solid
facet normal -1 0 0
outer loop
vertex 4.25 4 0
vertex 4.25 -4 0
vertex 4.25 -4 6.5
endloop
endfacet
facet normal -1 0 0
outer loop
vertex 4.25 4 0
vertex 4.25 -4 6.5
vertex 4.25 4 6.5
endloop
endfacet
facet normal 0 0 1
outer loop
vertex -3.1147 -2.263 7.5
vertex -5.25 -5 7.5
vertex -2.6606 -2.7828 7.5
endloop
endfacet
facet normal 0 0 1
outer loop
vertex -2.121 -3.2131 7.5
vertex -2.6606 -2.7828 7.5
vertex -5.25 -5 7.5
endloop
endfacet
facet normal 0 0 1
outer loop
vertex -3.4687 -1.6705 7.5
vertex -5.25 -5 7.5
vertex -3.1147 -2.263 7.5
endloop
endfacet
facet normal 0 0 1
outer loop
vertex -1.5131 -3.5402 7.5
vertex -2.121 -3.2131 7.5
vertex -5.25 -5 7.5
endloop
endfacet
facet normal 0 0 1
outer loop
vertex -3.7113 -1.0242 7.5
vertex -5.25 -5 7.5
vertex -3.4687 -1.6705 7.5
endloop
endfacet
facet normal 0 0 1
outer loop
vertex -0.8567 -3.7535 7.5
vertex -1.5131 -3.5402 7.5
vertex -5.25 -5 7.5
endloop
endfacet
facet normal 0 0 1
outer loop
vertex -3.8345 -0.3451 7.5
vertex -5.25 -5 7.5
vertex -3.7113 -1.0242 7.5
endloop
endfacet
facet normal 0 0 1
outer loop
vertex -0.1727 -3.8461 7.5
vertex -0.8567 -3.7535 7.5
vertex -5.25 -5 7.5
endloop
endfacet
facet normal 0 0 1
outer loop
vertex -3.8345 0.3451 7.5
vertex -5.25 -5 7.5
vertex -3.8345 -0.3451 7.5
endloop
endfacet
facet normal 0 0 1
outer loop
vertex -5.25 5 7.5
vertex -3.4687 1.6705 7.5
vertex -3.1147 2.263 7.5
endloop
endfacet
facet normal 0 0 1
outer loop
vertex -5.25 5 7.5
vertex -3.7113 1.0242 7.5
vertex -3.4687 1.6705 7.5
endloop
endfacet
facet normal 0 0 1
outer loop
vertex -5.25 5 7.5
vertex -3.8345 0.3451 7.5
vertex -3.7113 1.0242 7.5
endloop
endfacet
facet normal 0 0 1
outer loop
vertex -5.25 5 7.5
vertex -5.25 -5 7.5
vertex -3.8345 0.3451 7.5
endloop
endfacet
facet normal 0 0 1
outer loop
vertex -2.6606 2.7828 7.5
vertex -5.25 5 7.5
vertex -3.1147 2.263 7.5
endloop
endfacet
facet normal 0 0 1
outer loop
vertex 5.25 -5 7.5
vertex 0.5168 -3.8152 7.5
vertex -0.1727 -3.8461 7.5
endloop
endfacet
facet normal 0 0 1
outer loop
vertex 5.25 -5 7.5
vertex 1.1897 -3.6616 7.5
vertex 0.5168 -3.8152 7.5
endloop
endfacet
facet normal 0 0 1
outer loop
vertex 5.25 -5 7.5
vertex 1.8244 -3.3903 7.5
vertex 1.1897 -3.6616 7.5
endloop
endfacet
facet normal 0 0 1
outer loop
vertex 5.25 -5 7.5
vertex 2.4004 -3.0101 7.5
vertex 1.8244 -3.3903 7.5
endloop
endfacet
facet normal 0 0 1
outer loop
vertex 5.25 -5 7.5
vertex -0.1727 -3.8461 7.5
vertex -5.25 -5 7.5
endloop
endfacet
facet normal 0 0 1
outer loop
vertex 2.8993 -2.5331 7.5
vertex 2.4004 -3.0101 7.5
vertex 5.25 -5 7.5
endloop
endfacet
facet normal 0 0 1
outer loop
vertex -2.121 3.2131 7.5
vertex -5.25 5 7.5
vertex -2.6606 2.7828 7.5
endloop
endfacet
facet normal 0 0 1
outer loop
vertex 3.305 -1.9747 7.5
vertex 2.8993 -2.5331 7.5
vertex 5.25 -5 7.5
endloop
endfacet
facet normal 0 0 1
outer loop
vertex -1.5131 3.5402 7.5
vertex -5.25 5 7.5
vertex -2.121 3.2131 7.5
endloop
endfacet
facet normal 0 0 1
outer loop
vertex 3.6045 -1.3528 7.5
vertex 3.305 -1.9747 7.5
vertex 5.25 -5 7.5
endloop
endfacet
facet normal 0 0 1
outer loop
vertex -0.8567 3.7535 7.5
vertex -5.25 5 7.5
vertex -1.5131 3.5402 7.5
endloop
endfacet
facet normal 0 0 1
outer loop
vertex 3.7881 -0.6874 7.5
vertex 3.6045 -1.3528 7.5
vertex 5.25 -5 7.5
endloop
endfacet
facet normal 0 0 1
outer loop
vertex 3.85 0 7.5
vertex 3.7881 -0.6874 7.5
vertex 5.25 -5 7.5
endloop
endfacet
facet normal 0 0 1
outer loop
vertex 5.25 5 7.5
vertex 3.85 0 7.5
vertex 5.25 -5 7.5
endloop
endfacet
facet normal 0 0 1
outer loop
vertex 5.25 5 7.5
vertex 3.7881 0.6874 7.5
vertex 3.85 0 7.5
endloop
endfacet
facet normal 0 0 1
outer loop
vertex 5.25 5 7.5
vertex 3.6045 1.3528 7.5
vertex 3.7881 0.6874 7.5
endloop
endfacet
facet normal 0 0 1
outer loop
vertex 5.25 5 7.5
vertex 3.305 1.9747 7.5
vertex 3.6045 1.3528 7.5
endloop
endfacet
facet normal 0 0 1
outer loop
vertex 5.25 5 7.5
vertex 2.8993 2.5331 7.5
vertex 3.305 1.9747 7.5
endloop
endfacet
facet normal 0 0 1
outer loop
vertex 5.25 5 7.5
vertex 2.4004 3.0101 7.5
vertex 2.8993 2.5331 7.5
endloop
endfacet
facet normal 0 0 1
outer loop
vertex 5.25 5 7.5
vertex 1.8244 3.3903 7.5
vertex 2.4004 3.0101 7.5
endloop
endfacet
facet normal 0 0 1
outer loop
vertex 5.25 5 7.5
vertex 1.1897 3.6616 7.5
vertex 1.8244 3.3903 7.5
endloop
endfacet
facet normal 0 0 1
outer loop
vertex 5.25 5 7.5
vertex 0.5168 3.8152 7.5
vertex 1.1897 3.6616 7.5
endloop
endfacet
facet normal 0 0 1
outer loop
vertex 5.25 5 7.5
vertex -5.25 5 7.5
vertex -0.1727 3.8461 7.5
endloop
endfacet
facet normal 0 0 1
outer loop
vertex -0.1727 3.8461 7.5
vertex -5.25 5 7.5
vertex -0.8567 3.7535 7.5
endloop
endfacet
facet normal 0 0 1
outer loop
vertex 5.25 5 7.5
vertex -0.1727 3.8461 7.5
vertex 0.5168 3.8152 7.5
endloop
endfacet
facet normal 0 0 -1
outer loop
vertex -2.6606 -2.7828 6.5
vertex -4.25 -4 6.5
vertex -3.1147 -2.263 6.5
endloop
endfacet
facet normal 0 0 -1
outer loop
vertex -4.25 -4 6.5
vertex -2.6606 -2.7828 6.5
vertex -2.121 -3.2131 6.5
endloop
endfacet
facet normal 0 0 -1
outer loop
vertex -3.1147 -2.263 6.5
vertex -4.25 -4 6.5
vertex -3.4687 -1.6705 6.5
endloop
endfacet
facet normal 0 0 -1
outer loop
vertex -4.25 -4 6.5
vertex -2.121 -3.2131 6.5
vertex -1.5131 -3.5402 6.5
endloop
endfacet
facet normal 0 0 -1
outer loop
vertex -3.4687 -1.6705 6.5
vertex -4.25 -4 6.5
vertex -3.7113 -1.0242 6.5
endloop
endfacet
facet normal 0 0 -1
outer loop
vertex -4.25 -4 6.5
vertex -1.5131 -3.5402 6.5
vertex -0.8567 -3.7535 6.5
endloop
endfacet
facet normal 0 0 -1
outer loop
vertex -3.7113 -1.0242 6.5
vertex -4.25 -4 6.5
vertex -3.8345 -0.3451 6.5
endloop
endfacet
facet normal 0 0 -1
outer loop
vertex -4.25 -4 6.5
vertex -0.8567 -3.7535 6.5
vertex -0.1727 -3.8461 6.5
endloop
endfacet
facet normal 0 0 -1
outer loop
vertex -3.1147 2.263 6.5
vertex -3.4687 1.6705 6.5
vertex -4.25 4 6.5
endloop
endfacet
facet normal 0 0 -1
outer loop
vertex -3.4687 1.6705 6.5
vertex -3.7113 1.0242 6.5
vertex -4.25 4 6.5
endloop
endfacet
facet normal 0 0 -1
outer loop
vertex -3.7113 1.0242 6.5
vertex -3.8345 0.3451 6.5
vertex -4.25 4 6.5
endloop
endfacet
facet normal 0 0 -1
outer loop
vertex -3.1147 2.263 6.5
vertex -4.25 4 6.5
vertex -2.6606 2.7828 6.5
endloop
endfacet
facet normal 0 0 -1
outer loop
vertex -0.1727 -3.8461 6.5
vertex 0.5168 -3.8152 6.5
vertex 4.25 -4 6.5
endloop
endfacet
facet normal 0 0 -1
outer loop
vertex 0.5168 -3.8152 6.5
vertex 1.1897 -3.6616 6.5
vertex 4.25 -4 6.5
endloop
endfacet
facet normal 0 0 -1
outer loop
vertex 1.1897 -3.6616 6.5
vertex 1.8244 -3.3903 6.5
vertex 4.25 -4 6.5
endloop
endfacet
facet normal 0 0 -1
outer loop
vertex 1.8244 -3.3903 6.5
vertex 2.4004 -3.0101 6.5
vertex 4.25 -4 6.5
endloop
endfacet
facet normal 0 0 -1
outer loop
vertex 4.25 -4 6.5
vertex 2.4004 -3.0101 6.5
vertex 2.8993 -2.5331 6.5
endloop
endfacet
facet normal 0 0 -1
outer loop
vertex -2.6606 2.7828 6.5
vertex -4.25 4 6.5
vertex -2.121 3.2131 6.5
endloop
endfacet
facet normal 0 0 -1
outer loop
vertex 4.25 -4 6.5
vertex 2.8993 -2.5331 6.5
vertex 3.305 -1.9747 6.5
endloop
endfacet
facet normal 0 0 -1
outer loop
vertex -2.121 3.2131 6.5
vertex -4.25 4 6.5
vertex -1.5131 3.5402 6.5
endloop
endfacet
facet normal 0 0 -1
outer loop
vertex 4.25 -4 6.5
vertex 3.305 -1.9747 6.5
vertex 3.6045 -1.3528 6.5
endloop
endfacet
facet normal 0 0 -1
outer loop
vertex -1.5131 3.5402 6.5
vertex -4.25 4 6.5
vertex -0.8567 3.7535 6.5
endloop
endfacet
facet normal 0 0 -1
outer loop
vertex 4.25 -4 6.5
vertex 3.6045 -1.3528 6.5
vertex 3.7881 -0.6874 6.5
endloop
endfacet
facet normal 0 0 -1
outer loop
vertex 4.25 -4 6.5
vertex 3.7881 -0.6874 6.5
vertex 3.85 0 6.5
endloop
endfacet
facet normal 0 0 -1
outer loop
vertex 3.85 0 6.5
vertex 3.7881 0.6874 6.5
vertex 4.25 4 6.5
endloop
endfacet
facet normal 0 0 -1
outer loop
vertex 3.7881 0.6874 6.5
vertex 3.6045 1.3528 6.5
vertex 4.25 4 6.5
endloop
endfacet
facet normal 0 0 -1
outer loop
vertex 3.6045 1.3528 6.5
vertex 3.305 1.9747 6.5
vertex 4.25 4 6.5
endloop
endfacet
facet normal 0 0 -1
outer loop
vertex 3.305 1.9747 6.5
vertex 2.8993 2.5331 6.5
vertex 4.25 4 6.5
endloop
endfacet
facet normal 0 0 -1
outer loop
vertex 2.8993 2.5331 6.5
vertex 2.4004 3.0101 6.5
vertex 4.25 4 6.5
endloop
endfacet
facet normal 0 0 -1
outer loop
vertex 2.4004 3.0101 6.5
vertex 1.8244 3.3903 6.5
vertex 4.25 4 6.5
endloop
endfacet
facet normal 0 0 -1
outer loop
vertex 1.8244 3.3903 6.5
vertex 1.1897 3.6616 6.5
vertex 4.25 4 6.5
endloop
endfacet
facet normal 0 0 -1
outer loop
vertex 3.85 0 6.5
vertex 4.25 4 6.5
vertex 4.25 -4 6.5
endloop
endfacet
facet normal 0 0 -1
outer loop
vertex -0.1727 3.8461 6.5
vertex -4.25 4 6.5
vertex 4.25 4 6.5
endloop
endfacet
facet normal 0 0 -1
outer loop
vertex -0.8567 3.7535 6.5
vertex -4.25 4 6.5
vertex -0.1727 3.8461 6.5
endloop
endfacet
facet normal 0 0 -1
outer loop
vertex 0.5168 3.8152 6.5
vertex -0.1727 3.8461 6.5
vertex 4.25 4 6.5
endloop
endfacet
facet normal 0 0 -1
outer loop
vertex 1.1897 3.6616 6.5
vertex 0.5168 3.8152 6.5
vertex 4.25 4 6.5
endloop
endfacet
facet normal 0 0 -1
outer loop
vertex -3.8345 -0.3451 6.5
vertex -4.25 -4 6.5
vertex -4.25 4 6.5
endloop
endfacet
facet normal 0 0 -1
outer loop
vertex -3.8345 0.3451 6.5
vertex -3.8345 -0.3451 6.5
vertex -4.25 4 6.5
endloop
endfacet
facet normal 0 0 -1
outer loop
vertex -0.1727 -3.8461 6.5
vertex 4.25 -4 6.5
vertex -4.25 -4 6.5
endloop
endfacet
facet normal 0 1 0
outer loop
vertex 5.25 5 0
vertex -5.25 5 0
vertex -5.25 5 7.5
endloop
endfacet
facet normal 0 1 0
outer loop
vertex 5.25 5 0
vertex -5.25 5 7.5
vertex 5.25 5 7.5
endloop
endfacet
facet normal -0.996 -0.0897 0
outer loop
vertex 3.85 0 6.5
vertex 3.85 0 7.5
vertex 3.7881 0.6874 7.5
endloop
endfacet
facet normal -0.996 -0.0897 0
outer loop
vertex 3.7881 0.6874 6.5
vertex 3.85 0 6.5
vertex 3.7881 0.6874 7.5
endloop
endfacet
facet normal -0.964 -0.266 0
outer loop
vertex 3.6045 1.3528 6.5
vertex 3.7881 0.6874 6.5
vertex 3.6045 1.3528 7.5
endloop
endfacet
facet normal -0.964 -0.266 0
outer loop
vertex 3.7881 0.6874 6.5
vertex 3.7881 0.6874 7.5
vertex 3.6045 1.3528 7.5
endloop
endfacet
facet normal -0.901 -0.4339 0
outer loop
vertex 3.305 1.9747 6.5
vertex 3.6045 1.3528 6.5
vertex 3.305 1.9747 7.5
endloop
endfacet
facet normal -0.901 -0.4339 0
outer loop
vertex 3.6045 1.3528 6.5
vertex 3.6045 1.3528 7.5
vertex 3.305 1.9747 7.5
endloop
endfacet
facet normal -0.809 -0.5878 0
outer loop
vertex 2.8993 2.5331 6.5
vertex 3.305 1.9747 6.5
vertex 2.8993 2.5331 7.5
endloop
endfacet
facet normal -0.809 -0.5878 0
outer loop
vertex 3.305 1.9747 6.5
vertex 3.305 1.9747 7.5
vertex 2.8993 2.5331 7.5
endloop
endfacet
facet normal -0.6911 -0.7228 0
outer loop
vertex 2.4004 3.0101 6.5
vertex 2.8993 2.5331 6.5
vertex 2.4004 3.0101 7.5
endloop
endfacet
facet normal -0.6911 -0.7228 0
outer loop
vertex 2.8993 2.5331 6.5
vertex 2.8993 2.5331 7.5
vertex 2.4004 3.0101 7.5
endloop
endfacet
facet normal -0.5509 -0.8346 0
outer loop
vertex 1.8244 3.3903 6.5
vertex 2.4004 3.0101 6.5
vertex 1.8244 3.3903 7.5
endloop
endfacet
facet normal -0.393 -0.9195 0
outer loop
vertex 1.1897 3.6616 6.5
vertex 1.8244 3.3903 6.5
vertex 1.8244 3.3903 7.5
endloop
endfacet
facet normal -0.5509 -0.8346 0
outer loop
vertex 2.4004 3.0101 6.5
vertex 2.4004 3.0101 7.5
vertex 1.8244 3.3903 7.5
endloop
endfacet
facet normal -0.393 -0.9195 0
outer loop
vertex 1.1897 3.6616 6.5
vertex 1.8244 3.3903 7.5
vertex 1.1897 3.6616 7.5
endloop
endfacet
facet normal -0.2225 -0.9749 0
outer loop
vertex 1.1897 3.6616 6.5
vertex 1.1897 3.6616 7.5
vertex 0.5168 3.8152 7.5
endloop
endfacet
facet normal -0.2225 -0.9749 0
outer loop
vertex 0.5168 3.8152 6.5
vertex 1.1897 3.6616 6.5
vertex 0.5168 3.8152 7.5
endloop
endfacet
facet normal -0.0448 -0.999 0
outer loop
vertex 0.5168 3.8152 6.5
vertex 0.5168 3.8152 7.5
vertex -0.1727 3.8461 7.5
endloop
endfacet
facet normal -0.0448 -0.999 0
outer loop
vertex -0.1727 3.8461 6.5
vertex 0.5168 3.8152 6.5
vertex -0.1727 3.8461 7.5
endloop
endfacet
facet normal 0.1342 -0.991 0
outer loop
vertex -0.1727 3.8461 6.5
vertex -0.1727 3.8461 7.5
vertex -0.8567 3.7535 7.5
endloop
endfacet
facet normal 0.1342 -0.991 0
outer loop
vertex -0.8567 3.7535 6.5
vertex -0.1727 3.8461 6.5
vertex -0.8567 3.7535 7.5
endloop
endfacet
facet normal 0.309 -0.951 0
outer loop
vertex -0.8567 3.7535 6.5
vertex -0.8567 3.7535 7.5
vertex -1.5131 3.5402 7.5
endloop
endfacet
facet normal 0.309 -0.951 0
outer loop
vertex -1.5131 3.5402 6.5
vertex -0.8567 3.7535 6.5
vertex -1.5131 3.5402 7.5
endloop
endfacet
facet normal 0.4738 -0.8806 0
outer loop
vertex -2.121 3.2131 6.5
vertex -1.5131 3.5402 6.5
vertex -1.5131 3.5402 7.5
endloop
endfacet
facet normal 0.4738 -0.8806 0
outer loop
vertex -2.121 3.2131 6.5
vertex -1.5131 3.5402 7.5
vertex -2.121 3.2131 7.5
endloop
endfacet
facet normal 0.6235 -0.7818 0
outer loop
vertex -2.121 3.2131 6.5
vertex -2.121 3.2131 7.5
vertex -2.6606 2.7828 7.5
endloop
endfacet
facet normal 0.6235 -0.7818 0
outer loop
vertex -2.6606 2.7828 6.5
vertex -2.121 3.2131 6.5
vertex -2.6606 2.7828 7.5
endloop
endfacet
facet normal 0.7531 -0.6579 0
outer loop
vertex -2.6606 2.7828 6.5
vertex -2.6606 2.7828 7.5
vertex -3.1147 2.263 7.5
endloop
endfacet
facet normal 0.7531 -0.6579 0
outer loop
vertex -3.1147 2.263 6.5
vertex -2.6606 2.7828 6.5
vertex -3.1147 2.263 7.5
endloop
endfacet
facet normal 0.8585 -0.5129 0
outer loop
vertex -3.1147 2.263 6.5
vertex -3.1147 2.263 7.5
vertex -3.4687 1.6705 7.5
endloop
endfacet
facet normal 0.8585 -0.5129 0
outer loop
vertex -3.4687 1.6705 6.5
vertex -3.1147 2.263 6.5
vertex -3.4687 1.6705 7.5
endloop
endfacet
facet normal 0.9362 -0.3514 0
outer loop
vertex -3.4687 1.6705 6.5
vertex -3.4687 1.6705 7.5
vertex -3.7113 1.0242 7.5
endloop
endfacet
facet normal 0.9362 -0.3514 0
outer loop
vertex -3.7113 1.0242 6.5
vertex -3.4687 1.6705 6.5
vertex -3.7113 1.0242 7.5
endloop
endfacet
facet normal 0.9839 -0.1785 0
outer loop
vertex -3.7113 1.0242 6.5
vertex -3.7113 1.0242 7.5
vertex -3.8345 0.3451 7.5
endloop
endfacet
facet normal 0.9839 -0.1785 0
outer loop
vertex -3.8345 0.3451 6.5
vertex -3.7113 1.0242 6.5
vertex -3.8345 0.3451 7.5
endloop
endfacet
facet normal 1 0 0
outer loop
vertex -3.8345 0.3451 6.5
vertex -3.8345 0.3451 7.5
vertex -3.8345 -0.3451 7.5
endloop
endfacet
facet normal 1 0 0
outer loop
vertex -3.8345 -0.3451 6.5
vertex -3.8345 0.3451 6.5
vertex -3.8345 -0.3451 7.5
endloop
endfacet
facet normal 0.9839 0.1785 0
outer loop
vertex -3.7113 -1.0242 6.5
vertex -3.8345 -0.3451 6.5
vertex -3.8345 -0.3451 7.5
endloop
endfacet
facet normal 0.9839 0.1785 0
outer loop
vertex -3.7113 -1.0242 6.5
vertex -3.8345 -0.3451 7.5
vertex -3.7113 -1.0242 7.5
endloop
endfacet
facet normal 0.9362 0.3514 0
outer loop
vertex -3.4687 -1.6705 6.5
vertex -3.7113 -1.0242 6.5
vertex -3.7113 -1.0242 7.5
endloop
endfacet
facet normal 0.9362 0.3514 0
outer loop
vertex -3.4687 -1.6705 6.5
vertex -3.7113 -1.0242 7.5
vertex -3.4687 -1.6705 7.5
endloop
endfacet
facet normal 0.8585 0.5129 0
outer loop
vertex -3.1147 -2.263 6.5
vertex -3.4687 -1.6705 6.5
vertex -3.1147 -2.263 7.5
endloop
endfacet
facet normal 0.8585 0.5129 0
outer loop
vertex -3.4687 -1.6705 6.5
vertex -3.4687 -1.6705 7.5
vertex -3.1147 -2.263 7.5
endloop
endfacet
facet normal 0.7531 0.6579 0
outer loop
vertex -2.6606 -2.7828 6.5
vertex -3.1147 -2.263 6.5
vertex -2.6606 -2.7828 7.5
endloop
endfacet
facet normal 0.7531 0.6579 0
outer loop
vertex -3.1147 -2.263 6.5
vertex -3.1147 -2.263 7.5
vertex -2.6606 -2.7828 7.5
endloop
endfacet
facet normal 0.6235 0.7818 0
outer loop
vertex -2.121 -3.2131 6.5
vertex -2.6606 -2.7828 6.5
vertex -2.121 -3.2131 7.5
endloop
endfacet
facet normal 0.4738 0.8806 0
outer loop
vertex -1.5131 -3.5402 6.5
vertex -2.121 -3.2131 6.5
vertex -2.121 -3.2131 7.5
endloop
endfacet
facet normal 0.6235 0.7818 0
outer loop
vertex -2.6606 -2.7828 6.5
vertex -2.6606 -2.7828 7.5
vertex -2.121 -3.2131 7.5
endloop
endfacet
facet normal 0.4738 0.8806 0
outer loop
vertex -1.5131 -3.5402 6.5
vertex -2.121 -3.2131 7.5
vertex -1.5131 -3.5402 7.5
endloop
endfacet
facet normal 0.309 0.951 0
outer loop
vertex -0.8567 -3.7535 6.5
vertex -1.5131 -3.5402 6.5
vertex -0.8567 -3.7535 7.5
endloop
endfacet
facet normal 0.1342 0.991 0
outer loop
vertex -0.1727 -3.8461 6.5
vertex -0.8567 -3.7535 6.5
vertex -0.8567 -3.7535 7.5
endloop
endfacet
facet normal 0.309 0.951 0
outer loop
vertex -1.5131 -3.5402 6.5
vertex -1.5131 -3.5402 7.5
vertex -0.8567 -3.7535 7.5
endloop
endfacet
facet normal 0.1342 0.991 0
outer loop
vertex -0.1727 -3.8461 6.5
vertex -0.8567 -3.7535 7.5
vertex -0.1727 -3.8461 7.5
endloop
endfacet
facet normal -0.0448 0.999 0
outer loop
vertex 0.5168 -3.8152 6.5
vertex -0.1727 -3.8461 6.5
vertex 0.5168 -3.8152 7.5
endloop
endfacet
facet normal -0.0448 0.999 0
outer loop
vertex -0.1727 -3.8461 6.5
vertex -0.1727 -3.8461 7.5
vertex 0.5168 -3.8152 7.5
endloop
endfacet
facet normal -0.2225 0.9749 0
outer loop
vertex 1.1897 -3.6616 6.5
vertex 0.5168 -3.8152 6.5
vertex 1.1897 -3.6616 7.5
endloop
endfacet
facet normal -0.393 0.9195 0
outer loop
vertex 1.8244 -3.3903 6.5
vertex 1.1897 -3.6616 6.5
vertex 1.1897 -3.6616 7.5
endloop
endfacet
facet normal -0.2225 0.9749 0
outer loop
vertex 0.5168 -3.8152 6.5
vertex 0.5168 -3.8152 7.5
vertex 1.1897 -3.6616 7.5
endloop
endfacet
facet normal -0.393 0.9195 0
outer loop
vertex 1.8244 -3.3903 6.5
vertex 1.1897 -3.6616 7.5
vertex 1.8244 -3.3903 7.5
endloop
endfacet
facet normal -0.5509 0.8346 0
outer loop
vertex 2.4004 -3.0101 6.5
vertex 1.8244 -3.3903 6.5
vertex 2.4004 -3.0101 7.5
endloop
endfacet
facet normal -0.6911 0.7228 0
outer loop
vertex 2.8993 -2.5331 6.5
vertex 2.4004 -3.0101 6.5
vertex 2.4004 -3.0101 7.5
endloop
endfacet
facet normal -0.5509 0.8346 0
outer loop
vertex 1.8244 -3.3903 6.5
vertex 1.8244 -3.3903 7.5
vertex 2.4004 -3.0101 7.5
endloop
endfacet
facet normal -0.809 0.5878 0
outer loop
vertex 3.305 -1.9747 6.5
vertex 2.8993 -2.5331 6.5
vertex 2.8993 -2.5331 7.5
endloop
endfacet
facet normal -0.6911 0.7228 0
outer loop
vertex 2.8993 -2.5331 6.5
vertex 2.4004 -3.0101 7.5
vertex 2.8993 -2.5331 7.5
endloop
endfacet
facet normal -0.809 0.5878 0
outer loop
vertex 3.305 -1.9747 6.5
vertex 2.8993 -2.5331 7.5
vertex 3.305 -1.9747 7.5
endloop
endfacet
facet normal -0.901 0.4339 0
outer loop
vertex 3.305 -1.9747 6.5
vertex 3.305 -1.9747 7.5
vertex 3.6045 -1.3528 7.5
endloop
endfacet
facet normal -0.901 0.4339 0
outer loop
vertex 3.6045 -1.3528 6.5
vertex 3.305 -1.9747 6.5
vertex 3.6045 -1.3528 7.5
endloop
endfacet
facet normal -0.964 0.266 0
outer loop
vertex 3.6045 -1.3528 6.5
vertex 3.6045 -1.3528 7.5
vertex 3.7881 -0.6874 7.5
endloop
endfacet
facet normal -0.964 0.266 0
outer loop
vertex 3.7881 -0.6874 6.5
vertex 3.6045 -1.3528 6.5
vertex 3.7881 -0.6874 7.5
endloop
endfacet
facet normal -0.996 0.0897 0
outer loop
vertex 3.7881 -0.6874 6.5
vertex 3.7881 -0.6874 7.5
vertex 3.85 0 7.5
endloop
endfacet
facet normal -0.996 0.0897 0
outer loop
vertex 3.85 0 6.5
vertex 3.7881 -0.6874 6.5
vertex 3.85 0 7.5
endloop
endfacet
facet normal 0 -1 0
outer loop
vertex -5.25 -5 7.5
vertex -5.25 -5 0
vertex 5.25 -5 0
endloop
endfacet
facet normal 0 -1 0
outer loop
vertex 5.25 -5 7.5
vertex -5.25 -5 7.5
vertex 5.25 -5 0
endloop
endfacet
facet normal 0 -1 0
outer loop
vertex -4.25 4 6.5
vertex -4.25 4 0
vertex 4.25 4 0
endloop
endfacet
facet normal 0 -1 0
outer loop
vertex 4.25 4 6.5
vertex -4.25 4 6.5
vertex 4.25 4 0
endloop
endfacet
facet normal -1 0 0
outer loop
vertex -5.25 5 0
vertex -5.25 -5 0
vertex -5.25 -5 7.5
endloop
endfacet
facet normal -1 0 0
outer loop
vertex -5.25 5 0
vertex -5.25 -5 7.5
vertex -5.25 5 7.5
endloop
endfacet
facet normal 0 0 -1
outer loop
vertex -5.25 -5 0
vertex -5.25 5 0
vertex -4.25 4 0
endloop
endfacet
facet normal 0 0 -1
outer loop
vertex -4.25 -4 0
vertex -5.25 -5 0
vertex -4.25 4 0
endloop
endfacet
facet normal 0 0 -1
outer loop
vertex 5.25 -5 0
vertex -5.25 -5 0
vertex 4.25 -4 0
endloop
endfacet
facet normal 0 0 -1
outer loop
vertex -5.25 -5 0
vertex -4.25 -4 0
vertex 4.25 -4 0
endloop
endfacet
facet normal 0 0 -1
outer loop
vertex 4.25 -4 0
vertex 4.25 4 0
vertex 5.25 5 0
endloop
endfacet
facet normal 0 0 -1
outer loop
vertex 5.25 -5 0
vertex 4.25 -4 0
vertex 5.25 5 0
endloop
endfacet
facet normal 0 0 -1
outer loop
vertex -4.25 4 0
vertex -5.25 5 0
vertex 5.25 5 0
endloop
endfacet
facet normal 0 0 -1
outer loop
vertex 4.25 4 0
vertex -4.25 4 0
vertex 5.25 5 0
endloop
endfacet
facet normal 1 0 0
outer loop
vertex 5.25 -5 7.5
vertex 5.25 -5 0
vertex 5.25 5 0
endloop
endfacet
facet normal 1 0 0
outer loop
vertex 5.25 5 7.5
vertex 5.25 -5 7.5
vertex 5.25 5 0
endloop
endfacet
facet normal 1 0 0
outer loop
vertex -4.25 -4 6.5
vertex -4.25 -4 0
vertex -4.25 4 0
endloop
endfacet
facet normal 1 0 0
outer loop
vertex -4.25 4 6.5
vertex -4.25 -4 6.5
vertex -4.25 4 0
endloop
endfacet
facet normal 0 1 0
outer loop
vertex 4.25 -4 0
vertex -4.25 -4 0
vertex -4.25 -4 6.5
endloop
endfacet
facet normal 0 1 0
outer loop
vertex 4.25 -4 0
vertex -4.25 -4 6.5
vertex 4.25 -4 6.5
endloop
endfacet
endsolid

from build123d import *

# Parameters (mm, degrees)
SKETCH1_W           = 10.5
SKETCH1_H           = 10
BOSS_EXTRUDE1_DEPTH = 7.5
SHELL1_T            = 1
CUT_EXTRUDE1_REACH  = 12.431
SKETCH2_R           = 3.85
SKETCH3_W           = 8.5
SKETCH3_H           = 8
CUT_EXTRUDE2_DEPTH  = 1


with BuildPart() as part:
    # Sketch1 → Boss-Extrude1 (new body)
    with BuildSketch(Plane.XY):
        Rectangle(SKETCH1_W, SKETCH1_H)
    extrude(amount=BOSS_EXTRUDE1_DEPTH)

    # Shell1 (no face opened: a closed hollow body)
    add(offset(amount=-SHELL1_T, mode=Mode.PRIVATE), mode=Mode.SUBTRACT)

    # Sketch2 → Cut-Extrude1 (cut, up to next)
    with BuildSketch(Plane.XY.offset(7.5), mode=Mode.PRIVATE) as cut_extrude1_sk1:
        Circle(SKETCH2_R)
    cut_extrude1_tool1 = extrude(cut_extrude1_sk1.sketch, amount=-CUT_EXTRUDE1_REACH, mode=Mode.PRIVATE) & part.part
    add(cut_extrude1_tool1.solids().sort_by_distance((0, 0, 7.5))[0], mode=Mode.SUBTRACT)

    # Sketch3 → Cut-Extrude2 (cut)
    with BuildSketch(Plane.XY):
        Rectangle(SKETCH3_W, SKETCH3_H)
    extrude(amount=CUT_EXTRUDE2_DEPTH, mode=Mode.SUBTRACT)


solid = part.part
